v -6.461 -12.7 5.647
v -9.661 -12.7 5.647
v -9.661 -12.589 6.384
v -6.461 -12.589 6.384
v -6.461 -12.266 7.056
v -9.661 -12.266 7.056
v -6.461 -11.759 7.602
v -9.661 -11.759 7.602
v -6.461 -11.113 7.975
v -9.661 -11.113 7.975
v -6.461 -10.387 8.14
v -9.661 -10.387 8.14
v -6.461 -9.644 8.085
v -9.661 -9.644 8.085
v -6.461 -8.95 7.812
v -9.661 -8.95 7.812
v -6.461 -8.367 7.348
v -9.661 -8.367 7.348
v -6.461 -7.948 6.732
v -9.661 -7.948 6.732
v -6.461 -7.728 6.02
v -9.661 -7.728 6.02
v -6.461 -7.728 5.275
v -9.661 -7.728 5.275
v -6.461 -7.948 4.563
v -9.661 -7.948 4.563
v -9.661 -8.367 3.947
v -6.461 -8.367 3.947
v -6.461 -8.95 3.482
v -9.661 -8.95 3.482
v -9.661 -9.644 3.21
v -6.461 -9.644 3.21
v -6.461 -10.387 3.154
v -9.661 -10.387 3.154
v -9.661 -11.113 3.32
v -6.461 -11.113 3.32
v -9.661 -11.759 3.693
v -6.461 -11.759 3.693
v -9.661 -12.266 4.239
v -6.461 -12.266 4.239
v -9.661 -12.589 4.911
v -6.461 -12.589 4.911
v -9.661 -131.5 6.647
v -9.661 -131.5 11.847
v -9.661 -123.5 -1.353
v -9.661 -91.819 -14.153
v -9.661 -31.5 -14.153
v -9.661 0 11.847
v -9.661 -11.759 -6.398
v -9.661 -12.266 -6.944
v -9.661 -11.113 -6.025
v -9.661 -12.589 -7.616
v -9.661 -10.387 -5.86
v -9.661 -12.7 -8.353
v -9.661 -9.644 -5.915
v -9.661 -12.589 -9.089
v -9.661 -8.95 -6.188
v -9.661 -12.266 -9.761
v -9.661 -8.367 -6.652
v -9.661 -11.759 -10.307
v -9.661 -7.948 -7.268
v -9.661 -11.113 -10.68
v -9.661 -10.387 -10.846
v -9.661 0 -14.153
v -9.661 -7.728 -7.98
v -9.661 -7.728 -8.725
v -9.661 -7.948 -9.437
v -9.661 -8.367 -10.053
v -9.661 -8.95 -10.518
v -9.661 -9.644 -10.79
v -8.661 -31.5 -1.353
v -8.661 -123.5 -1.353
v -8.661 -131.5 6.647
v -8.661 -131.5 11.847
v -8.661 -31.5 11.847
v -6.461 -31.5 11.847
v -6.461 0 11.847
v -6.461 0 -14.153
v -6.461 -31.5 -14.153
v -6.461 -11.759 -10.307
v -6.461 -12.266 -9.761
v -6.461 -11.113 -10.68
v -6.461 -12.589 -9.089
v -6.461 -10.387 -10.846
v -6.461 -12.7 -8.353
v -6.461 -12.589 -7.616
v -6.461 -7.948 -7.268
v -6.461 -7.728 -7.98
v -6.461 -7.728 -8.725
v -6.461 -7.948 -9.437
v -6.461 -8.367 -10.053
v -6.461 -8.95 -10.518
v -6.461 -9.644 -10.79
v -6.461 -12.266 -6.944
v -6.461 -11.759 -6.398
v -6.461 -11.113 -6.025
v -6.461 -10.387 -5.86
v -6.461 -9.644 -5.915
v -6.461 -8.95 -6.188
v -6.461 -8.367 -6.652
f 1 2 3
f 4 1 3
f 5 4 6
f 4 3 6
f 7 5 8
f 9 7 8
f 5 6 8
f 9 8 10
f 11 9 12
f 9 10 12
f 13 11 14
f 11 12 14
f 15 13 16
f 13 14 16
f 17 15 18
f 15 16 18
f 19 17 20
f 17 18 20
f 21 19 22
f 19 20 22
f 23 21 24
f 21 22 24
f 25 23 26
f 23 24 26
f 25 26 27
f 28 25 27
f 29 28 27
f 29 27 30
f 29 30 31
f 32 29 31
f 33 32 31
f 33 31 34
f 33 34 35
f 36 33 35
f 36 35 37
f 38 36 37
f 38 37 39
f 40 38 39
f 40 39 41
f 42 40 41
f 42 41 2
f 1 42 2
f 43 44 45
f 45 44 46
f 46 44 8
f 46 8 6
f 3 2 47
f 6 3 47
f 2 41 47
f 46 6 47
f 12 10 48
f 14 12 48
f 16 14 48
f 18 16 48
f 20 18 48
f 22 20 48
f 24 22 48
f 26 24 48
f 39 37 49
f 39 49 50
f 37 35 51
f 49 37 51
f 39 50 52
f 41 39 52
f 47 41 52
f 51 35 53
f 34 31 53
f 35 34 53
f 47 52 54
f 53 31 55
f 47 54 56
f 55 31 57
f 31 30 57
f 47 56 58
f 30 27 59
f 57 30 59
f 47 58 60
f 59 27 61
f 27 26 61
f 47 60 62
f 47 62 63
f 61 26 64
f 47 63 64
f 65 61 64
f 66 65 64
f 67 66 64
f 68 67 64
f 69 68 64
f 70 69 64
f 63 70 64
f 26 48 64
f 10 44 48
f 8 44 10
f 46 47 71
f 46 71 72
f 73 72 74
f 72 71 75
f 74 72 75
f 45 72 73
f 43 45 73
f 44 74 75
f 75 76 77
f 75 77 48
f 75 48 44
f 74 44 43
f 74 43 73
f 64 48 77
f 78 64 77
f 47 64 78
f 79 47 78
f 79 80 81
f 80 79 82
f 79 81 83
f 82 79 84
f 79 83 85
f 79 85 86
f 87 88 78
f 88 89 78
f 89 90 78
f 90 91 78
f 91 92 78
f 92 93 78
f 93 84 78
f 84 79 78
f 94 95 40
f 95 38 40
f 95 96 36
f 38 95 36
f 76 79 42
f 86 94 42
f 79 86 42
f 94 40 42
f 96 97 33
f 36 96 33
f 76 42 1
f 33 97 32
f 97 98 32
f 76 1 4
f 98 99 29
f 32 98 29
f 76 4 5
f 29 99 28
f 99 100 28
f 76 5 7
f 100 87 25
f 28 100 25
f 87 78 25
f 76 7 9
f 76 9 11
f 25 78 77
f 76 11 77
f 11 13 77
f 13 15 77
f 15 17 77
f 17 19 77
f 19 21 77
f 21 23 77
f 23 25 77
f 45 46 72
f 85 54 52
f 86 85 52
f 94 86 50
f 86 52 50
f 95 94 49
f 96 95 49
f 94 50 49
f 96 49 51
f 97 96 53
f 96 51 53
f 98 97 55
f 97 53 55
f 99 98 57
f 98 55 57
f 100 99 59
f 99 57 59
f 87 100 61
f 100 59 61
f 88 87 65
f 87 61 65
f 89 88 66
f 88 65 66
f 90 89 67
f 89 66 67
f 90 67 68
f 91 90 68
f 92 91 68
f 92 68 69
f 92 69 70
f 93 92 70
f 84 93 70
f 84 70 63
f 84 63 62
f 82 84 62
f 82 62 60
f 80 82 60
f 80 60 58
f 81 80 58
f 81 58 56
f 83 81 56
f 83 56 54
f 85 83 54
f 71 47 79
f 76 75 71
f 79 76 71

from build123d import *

# Parameters (mm, degrees)
F1_DEPTH = 31.5
F2_DEPTH = 131.5
F6_DEPTH = 25
F7_D     = 5
F7_DEPTH = 300
F7_START = 6.4609628
F7_TIP   = 1.5021515476


with BuildPart() as f1:
    # F0 (on Front) → F1 (new body)
    with BuildSketch(Plane.XZ):
        Polygon((-8.6609627543, 11.8473982275), (-9.6609627543, 11.8473982275), (-9.6609627543, -14.1526017725), (-8.6609627543, -1.3526017725), align=None)
        Polygon((-6.4609627543, 11.8473982275), (-8.6609627543, 11.8473982275), (-8.6609627543, -1.3526017725), (-9.6609627543, -14.1526017725), (-8.6609627543, -14.1526017725), (-6.4609627543, -14.1526017725), align=None)
    extrude(amount=F1_DEPTH)

    # F0 (on Front) → F2 (join)
    with BuildSketch(Plane.XZ):
        Polygon((-8.6609627543, 11.8473982275), (-9.6609627543, 11.8473982275), (-9.6609627543, -14.1526017725), (-8.6609627543, -1.3526017725), align=None)
    extrude(amount=F2_DEPTH)

    # F5 (on Right) → F6 (cut)
    with BuildSketch(Plane.YZ):
        Polygon((-123.5, -1.3526017725), (-131.5, -1.3526017725), (-131.5, -14.1526017725), (-123.5, -14.1526017725), (-91.8188882763, -14.1526017725), align=None)
        Polygon((-123.5, -1.3526017725), (-131.5, 6.6473982275), (-131.5, -1.3526017725), align=None)
    extrude(amount=-F6_DEPTH, mode=Mode.SUBTRACT)

    # F7
    # its depths count from where the whole tool has entered the part; down to there all is cleared
    with Locations(Plane.YZ.offset(-F7_START)):
        with Locations((-10.2, 5.6473982275), (-10.2, -8.3526017725)):
            Hole(F7_D / 2, depth=F7_DEPTH)
            with Locations((0, 0, -(F7_DEPTH + F7_TIP / 2))):  # 118° drill point
                Cone(0, F7_D / 2, F7_TIP, mode=Mode.SUBTRACT)


solid = f1.part
